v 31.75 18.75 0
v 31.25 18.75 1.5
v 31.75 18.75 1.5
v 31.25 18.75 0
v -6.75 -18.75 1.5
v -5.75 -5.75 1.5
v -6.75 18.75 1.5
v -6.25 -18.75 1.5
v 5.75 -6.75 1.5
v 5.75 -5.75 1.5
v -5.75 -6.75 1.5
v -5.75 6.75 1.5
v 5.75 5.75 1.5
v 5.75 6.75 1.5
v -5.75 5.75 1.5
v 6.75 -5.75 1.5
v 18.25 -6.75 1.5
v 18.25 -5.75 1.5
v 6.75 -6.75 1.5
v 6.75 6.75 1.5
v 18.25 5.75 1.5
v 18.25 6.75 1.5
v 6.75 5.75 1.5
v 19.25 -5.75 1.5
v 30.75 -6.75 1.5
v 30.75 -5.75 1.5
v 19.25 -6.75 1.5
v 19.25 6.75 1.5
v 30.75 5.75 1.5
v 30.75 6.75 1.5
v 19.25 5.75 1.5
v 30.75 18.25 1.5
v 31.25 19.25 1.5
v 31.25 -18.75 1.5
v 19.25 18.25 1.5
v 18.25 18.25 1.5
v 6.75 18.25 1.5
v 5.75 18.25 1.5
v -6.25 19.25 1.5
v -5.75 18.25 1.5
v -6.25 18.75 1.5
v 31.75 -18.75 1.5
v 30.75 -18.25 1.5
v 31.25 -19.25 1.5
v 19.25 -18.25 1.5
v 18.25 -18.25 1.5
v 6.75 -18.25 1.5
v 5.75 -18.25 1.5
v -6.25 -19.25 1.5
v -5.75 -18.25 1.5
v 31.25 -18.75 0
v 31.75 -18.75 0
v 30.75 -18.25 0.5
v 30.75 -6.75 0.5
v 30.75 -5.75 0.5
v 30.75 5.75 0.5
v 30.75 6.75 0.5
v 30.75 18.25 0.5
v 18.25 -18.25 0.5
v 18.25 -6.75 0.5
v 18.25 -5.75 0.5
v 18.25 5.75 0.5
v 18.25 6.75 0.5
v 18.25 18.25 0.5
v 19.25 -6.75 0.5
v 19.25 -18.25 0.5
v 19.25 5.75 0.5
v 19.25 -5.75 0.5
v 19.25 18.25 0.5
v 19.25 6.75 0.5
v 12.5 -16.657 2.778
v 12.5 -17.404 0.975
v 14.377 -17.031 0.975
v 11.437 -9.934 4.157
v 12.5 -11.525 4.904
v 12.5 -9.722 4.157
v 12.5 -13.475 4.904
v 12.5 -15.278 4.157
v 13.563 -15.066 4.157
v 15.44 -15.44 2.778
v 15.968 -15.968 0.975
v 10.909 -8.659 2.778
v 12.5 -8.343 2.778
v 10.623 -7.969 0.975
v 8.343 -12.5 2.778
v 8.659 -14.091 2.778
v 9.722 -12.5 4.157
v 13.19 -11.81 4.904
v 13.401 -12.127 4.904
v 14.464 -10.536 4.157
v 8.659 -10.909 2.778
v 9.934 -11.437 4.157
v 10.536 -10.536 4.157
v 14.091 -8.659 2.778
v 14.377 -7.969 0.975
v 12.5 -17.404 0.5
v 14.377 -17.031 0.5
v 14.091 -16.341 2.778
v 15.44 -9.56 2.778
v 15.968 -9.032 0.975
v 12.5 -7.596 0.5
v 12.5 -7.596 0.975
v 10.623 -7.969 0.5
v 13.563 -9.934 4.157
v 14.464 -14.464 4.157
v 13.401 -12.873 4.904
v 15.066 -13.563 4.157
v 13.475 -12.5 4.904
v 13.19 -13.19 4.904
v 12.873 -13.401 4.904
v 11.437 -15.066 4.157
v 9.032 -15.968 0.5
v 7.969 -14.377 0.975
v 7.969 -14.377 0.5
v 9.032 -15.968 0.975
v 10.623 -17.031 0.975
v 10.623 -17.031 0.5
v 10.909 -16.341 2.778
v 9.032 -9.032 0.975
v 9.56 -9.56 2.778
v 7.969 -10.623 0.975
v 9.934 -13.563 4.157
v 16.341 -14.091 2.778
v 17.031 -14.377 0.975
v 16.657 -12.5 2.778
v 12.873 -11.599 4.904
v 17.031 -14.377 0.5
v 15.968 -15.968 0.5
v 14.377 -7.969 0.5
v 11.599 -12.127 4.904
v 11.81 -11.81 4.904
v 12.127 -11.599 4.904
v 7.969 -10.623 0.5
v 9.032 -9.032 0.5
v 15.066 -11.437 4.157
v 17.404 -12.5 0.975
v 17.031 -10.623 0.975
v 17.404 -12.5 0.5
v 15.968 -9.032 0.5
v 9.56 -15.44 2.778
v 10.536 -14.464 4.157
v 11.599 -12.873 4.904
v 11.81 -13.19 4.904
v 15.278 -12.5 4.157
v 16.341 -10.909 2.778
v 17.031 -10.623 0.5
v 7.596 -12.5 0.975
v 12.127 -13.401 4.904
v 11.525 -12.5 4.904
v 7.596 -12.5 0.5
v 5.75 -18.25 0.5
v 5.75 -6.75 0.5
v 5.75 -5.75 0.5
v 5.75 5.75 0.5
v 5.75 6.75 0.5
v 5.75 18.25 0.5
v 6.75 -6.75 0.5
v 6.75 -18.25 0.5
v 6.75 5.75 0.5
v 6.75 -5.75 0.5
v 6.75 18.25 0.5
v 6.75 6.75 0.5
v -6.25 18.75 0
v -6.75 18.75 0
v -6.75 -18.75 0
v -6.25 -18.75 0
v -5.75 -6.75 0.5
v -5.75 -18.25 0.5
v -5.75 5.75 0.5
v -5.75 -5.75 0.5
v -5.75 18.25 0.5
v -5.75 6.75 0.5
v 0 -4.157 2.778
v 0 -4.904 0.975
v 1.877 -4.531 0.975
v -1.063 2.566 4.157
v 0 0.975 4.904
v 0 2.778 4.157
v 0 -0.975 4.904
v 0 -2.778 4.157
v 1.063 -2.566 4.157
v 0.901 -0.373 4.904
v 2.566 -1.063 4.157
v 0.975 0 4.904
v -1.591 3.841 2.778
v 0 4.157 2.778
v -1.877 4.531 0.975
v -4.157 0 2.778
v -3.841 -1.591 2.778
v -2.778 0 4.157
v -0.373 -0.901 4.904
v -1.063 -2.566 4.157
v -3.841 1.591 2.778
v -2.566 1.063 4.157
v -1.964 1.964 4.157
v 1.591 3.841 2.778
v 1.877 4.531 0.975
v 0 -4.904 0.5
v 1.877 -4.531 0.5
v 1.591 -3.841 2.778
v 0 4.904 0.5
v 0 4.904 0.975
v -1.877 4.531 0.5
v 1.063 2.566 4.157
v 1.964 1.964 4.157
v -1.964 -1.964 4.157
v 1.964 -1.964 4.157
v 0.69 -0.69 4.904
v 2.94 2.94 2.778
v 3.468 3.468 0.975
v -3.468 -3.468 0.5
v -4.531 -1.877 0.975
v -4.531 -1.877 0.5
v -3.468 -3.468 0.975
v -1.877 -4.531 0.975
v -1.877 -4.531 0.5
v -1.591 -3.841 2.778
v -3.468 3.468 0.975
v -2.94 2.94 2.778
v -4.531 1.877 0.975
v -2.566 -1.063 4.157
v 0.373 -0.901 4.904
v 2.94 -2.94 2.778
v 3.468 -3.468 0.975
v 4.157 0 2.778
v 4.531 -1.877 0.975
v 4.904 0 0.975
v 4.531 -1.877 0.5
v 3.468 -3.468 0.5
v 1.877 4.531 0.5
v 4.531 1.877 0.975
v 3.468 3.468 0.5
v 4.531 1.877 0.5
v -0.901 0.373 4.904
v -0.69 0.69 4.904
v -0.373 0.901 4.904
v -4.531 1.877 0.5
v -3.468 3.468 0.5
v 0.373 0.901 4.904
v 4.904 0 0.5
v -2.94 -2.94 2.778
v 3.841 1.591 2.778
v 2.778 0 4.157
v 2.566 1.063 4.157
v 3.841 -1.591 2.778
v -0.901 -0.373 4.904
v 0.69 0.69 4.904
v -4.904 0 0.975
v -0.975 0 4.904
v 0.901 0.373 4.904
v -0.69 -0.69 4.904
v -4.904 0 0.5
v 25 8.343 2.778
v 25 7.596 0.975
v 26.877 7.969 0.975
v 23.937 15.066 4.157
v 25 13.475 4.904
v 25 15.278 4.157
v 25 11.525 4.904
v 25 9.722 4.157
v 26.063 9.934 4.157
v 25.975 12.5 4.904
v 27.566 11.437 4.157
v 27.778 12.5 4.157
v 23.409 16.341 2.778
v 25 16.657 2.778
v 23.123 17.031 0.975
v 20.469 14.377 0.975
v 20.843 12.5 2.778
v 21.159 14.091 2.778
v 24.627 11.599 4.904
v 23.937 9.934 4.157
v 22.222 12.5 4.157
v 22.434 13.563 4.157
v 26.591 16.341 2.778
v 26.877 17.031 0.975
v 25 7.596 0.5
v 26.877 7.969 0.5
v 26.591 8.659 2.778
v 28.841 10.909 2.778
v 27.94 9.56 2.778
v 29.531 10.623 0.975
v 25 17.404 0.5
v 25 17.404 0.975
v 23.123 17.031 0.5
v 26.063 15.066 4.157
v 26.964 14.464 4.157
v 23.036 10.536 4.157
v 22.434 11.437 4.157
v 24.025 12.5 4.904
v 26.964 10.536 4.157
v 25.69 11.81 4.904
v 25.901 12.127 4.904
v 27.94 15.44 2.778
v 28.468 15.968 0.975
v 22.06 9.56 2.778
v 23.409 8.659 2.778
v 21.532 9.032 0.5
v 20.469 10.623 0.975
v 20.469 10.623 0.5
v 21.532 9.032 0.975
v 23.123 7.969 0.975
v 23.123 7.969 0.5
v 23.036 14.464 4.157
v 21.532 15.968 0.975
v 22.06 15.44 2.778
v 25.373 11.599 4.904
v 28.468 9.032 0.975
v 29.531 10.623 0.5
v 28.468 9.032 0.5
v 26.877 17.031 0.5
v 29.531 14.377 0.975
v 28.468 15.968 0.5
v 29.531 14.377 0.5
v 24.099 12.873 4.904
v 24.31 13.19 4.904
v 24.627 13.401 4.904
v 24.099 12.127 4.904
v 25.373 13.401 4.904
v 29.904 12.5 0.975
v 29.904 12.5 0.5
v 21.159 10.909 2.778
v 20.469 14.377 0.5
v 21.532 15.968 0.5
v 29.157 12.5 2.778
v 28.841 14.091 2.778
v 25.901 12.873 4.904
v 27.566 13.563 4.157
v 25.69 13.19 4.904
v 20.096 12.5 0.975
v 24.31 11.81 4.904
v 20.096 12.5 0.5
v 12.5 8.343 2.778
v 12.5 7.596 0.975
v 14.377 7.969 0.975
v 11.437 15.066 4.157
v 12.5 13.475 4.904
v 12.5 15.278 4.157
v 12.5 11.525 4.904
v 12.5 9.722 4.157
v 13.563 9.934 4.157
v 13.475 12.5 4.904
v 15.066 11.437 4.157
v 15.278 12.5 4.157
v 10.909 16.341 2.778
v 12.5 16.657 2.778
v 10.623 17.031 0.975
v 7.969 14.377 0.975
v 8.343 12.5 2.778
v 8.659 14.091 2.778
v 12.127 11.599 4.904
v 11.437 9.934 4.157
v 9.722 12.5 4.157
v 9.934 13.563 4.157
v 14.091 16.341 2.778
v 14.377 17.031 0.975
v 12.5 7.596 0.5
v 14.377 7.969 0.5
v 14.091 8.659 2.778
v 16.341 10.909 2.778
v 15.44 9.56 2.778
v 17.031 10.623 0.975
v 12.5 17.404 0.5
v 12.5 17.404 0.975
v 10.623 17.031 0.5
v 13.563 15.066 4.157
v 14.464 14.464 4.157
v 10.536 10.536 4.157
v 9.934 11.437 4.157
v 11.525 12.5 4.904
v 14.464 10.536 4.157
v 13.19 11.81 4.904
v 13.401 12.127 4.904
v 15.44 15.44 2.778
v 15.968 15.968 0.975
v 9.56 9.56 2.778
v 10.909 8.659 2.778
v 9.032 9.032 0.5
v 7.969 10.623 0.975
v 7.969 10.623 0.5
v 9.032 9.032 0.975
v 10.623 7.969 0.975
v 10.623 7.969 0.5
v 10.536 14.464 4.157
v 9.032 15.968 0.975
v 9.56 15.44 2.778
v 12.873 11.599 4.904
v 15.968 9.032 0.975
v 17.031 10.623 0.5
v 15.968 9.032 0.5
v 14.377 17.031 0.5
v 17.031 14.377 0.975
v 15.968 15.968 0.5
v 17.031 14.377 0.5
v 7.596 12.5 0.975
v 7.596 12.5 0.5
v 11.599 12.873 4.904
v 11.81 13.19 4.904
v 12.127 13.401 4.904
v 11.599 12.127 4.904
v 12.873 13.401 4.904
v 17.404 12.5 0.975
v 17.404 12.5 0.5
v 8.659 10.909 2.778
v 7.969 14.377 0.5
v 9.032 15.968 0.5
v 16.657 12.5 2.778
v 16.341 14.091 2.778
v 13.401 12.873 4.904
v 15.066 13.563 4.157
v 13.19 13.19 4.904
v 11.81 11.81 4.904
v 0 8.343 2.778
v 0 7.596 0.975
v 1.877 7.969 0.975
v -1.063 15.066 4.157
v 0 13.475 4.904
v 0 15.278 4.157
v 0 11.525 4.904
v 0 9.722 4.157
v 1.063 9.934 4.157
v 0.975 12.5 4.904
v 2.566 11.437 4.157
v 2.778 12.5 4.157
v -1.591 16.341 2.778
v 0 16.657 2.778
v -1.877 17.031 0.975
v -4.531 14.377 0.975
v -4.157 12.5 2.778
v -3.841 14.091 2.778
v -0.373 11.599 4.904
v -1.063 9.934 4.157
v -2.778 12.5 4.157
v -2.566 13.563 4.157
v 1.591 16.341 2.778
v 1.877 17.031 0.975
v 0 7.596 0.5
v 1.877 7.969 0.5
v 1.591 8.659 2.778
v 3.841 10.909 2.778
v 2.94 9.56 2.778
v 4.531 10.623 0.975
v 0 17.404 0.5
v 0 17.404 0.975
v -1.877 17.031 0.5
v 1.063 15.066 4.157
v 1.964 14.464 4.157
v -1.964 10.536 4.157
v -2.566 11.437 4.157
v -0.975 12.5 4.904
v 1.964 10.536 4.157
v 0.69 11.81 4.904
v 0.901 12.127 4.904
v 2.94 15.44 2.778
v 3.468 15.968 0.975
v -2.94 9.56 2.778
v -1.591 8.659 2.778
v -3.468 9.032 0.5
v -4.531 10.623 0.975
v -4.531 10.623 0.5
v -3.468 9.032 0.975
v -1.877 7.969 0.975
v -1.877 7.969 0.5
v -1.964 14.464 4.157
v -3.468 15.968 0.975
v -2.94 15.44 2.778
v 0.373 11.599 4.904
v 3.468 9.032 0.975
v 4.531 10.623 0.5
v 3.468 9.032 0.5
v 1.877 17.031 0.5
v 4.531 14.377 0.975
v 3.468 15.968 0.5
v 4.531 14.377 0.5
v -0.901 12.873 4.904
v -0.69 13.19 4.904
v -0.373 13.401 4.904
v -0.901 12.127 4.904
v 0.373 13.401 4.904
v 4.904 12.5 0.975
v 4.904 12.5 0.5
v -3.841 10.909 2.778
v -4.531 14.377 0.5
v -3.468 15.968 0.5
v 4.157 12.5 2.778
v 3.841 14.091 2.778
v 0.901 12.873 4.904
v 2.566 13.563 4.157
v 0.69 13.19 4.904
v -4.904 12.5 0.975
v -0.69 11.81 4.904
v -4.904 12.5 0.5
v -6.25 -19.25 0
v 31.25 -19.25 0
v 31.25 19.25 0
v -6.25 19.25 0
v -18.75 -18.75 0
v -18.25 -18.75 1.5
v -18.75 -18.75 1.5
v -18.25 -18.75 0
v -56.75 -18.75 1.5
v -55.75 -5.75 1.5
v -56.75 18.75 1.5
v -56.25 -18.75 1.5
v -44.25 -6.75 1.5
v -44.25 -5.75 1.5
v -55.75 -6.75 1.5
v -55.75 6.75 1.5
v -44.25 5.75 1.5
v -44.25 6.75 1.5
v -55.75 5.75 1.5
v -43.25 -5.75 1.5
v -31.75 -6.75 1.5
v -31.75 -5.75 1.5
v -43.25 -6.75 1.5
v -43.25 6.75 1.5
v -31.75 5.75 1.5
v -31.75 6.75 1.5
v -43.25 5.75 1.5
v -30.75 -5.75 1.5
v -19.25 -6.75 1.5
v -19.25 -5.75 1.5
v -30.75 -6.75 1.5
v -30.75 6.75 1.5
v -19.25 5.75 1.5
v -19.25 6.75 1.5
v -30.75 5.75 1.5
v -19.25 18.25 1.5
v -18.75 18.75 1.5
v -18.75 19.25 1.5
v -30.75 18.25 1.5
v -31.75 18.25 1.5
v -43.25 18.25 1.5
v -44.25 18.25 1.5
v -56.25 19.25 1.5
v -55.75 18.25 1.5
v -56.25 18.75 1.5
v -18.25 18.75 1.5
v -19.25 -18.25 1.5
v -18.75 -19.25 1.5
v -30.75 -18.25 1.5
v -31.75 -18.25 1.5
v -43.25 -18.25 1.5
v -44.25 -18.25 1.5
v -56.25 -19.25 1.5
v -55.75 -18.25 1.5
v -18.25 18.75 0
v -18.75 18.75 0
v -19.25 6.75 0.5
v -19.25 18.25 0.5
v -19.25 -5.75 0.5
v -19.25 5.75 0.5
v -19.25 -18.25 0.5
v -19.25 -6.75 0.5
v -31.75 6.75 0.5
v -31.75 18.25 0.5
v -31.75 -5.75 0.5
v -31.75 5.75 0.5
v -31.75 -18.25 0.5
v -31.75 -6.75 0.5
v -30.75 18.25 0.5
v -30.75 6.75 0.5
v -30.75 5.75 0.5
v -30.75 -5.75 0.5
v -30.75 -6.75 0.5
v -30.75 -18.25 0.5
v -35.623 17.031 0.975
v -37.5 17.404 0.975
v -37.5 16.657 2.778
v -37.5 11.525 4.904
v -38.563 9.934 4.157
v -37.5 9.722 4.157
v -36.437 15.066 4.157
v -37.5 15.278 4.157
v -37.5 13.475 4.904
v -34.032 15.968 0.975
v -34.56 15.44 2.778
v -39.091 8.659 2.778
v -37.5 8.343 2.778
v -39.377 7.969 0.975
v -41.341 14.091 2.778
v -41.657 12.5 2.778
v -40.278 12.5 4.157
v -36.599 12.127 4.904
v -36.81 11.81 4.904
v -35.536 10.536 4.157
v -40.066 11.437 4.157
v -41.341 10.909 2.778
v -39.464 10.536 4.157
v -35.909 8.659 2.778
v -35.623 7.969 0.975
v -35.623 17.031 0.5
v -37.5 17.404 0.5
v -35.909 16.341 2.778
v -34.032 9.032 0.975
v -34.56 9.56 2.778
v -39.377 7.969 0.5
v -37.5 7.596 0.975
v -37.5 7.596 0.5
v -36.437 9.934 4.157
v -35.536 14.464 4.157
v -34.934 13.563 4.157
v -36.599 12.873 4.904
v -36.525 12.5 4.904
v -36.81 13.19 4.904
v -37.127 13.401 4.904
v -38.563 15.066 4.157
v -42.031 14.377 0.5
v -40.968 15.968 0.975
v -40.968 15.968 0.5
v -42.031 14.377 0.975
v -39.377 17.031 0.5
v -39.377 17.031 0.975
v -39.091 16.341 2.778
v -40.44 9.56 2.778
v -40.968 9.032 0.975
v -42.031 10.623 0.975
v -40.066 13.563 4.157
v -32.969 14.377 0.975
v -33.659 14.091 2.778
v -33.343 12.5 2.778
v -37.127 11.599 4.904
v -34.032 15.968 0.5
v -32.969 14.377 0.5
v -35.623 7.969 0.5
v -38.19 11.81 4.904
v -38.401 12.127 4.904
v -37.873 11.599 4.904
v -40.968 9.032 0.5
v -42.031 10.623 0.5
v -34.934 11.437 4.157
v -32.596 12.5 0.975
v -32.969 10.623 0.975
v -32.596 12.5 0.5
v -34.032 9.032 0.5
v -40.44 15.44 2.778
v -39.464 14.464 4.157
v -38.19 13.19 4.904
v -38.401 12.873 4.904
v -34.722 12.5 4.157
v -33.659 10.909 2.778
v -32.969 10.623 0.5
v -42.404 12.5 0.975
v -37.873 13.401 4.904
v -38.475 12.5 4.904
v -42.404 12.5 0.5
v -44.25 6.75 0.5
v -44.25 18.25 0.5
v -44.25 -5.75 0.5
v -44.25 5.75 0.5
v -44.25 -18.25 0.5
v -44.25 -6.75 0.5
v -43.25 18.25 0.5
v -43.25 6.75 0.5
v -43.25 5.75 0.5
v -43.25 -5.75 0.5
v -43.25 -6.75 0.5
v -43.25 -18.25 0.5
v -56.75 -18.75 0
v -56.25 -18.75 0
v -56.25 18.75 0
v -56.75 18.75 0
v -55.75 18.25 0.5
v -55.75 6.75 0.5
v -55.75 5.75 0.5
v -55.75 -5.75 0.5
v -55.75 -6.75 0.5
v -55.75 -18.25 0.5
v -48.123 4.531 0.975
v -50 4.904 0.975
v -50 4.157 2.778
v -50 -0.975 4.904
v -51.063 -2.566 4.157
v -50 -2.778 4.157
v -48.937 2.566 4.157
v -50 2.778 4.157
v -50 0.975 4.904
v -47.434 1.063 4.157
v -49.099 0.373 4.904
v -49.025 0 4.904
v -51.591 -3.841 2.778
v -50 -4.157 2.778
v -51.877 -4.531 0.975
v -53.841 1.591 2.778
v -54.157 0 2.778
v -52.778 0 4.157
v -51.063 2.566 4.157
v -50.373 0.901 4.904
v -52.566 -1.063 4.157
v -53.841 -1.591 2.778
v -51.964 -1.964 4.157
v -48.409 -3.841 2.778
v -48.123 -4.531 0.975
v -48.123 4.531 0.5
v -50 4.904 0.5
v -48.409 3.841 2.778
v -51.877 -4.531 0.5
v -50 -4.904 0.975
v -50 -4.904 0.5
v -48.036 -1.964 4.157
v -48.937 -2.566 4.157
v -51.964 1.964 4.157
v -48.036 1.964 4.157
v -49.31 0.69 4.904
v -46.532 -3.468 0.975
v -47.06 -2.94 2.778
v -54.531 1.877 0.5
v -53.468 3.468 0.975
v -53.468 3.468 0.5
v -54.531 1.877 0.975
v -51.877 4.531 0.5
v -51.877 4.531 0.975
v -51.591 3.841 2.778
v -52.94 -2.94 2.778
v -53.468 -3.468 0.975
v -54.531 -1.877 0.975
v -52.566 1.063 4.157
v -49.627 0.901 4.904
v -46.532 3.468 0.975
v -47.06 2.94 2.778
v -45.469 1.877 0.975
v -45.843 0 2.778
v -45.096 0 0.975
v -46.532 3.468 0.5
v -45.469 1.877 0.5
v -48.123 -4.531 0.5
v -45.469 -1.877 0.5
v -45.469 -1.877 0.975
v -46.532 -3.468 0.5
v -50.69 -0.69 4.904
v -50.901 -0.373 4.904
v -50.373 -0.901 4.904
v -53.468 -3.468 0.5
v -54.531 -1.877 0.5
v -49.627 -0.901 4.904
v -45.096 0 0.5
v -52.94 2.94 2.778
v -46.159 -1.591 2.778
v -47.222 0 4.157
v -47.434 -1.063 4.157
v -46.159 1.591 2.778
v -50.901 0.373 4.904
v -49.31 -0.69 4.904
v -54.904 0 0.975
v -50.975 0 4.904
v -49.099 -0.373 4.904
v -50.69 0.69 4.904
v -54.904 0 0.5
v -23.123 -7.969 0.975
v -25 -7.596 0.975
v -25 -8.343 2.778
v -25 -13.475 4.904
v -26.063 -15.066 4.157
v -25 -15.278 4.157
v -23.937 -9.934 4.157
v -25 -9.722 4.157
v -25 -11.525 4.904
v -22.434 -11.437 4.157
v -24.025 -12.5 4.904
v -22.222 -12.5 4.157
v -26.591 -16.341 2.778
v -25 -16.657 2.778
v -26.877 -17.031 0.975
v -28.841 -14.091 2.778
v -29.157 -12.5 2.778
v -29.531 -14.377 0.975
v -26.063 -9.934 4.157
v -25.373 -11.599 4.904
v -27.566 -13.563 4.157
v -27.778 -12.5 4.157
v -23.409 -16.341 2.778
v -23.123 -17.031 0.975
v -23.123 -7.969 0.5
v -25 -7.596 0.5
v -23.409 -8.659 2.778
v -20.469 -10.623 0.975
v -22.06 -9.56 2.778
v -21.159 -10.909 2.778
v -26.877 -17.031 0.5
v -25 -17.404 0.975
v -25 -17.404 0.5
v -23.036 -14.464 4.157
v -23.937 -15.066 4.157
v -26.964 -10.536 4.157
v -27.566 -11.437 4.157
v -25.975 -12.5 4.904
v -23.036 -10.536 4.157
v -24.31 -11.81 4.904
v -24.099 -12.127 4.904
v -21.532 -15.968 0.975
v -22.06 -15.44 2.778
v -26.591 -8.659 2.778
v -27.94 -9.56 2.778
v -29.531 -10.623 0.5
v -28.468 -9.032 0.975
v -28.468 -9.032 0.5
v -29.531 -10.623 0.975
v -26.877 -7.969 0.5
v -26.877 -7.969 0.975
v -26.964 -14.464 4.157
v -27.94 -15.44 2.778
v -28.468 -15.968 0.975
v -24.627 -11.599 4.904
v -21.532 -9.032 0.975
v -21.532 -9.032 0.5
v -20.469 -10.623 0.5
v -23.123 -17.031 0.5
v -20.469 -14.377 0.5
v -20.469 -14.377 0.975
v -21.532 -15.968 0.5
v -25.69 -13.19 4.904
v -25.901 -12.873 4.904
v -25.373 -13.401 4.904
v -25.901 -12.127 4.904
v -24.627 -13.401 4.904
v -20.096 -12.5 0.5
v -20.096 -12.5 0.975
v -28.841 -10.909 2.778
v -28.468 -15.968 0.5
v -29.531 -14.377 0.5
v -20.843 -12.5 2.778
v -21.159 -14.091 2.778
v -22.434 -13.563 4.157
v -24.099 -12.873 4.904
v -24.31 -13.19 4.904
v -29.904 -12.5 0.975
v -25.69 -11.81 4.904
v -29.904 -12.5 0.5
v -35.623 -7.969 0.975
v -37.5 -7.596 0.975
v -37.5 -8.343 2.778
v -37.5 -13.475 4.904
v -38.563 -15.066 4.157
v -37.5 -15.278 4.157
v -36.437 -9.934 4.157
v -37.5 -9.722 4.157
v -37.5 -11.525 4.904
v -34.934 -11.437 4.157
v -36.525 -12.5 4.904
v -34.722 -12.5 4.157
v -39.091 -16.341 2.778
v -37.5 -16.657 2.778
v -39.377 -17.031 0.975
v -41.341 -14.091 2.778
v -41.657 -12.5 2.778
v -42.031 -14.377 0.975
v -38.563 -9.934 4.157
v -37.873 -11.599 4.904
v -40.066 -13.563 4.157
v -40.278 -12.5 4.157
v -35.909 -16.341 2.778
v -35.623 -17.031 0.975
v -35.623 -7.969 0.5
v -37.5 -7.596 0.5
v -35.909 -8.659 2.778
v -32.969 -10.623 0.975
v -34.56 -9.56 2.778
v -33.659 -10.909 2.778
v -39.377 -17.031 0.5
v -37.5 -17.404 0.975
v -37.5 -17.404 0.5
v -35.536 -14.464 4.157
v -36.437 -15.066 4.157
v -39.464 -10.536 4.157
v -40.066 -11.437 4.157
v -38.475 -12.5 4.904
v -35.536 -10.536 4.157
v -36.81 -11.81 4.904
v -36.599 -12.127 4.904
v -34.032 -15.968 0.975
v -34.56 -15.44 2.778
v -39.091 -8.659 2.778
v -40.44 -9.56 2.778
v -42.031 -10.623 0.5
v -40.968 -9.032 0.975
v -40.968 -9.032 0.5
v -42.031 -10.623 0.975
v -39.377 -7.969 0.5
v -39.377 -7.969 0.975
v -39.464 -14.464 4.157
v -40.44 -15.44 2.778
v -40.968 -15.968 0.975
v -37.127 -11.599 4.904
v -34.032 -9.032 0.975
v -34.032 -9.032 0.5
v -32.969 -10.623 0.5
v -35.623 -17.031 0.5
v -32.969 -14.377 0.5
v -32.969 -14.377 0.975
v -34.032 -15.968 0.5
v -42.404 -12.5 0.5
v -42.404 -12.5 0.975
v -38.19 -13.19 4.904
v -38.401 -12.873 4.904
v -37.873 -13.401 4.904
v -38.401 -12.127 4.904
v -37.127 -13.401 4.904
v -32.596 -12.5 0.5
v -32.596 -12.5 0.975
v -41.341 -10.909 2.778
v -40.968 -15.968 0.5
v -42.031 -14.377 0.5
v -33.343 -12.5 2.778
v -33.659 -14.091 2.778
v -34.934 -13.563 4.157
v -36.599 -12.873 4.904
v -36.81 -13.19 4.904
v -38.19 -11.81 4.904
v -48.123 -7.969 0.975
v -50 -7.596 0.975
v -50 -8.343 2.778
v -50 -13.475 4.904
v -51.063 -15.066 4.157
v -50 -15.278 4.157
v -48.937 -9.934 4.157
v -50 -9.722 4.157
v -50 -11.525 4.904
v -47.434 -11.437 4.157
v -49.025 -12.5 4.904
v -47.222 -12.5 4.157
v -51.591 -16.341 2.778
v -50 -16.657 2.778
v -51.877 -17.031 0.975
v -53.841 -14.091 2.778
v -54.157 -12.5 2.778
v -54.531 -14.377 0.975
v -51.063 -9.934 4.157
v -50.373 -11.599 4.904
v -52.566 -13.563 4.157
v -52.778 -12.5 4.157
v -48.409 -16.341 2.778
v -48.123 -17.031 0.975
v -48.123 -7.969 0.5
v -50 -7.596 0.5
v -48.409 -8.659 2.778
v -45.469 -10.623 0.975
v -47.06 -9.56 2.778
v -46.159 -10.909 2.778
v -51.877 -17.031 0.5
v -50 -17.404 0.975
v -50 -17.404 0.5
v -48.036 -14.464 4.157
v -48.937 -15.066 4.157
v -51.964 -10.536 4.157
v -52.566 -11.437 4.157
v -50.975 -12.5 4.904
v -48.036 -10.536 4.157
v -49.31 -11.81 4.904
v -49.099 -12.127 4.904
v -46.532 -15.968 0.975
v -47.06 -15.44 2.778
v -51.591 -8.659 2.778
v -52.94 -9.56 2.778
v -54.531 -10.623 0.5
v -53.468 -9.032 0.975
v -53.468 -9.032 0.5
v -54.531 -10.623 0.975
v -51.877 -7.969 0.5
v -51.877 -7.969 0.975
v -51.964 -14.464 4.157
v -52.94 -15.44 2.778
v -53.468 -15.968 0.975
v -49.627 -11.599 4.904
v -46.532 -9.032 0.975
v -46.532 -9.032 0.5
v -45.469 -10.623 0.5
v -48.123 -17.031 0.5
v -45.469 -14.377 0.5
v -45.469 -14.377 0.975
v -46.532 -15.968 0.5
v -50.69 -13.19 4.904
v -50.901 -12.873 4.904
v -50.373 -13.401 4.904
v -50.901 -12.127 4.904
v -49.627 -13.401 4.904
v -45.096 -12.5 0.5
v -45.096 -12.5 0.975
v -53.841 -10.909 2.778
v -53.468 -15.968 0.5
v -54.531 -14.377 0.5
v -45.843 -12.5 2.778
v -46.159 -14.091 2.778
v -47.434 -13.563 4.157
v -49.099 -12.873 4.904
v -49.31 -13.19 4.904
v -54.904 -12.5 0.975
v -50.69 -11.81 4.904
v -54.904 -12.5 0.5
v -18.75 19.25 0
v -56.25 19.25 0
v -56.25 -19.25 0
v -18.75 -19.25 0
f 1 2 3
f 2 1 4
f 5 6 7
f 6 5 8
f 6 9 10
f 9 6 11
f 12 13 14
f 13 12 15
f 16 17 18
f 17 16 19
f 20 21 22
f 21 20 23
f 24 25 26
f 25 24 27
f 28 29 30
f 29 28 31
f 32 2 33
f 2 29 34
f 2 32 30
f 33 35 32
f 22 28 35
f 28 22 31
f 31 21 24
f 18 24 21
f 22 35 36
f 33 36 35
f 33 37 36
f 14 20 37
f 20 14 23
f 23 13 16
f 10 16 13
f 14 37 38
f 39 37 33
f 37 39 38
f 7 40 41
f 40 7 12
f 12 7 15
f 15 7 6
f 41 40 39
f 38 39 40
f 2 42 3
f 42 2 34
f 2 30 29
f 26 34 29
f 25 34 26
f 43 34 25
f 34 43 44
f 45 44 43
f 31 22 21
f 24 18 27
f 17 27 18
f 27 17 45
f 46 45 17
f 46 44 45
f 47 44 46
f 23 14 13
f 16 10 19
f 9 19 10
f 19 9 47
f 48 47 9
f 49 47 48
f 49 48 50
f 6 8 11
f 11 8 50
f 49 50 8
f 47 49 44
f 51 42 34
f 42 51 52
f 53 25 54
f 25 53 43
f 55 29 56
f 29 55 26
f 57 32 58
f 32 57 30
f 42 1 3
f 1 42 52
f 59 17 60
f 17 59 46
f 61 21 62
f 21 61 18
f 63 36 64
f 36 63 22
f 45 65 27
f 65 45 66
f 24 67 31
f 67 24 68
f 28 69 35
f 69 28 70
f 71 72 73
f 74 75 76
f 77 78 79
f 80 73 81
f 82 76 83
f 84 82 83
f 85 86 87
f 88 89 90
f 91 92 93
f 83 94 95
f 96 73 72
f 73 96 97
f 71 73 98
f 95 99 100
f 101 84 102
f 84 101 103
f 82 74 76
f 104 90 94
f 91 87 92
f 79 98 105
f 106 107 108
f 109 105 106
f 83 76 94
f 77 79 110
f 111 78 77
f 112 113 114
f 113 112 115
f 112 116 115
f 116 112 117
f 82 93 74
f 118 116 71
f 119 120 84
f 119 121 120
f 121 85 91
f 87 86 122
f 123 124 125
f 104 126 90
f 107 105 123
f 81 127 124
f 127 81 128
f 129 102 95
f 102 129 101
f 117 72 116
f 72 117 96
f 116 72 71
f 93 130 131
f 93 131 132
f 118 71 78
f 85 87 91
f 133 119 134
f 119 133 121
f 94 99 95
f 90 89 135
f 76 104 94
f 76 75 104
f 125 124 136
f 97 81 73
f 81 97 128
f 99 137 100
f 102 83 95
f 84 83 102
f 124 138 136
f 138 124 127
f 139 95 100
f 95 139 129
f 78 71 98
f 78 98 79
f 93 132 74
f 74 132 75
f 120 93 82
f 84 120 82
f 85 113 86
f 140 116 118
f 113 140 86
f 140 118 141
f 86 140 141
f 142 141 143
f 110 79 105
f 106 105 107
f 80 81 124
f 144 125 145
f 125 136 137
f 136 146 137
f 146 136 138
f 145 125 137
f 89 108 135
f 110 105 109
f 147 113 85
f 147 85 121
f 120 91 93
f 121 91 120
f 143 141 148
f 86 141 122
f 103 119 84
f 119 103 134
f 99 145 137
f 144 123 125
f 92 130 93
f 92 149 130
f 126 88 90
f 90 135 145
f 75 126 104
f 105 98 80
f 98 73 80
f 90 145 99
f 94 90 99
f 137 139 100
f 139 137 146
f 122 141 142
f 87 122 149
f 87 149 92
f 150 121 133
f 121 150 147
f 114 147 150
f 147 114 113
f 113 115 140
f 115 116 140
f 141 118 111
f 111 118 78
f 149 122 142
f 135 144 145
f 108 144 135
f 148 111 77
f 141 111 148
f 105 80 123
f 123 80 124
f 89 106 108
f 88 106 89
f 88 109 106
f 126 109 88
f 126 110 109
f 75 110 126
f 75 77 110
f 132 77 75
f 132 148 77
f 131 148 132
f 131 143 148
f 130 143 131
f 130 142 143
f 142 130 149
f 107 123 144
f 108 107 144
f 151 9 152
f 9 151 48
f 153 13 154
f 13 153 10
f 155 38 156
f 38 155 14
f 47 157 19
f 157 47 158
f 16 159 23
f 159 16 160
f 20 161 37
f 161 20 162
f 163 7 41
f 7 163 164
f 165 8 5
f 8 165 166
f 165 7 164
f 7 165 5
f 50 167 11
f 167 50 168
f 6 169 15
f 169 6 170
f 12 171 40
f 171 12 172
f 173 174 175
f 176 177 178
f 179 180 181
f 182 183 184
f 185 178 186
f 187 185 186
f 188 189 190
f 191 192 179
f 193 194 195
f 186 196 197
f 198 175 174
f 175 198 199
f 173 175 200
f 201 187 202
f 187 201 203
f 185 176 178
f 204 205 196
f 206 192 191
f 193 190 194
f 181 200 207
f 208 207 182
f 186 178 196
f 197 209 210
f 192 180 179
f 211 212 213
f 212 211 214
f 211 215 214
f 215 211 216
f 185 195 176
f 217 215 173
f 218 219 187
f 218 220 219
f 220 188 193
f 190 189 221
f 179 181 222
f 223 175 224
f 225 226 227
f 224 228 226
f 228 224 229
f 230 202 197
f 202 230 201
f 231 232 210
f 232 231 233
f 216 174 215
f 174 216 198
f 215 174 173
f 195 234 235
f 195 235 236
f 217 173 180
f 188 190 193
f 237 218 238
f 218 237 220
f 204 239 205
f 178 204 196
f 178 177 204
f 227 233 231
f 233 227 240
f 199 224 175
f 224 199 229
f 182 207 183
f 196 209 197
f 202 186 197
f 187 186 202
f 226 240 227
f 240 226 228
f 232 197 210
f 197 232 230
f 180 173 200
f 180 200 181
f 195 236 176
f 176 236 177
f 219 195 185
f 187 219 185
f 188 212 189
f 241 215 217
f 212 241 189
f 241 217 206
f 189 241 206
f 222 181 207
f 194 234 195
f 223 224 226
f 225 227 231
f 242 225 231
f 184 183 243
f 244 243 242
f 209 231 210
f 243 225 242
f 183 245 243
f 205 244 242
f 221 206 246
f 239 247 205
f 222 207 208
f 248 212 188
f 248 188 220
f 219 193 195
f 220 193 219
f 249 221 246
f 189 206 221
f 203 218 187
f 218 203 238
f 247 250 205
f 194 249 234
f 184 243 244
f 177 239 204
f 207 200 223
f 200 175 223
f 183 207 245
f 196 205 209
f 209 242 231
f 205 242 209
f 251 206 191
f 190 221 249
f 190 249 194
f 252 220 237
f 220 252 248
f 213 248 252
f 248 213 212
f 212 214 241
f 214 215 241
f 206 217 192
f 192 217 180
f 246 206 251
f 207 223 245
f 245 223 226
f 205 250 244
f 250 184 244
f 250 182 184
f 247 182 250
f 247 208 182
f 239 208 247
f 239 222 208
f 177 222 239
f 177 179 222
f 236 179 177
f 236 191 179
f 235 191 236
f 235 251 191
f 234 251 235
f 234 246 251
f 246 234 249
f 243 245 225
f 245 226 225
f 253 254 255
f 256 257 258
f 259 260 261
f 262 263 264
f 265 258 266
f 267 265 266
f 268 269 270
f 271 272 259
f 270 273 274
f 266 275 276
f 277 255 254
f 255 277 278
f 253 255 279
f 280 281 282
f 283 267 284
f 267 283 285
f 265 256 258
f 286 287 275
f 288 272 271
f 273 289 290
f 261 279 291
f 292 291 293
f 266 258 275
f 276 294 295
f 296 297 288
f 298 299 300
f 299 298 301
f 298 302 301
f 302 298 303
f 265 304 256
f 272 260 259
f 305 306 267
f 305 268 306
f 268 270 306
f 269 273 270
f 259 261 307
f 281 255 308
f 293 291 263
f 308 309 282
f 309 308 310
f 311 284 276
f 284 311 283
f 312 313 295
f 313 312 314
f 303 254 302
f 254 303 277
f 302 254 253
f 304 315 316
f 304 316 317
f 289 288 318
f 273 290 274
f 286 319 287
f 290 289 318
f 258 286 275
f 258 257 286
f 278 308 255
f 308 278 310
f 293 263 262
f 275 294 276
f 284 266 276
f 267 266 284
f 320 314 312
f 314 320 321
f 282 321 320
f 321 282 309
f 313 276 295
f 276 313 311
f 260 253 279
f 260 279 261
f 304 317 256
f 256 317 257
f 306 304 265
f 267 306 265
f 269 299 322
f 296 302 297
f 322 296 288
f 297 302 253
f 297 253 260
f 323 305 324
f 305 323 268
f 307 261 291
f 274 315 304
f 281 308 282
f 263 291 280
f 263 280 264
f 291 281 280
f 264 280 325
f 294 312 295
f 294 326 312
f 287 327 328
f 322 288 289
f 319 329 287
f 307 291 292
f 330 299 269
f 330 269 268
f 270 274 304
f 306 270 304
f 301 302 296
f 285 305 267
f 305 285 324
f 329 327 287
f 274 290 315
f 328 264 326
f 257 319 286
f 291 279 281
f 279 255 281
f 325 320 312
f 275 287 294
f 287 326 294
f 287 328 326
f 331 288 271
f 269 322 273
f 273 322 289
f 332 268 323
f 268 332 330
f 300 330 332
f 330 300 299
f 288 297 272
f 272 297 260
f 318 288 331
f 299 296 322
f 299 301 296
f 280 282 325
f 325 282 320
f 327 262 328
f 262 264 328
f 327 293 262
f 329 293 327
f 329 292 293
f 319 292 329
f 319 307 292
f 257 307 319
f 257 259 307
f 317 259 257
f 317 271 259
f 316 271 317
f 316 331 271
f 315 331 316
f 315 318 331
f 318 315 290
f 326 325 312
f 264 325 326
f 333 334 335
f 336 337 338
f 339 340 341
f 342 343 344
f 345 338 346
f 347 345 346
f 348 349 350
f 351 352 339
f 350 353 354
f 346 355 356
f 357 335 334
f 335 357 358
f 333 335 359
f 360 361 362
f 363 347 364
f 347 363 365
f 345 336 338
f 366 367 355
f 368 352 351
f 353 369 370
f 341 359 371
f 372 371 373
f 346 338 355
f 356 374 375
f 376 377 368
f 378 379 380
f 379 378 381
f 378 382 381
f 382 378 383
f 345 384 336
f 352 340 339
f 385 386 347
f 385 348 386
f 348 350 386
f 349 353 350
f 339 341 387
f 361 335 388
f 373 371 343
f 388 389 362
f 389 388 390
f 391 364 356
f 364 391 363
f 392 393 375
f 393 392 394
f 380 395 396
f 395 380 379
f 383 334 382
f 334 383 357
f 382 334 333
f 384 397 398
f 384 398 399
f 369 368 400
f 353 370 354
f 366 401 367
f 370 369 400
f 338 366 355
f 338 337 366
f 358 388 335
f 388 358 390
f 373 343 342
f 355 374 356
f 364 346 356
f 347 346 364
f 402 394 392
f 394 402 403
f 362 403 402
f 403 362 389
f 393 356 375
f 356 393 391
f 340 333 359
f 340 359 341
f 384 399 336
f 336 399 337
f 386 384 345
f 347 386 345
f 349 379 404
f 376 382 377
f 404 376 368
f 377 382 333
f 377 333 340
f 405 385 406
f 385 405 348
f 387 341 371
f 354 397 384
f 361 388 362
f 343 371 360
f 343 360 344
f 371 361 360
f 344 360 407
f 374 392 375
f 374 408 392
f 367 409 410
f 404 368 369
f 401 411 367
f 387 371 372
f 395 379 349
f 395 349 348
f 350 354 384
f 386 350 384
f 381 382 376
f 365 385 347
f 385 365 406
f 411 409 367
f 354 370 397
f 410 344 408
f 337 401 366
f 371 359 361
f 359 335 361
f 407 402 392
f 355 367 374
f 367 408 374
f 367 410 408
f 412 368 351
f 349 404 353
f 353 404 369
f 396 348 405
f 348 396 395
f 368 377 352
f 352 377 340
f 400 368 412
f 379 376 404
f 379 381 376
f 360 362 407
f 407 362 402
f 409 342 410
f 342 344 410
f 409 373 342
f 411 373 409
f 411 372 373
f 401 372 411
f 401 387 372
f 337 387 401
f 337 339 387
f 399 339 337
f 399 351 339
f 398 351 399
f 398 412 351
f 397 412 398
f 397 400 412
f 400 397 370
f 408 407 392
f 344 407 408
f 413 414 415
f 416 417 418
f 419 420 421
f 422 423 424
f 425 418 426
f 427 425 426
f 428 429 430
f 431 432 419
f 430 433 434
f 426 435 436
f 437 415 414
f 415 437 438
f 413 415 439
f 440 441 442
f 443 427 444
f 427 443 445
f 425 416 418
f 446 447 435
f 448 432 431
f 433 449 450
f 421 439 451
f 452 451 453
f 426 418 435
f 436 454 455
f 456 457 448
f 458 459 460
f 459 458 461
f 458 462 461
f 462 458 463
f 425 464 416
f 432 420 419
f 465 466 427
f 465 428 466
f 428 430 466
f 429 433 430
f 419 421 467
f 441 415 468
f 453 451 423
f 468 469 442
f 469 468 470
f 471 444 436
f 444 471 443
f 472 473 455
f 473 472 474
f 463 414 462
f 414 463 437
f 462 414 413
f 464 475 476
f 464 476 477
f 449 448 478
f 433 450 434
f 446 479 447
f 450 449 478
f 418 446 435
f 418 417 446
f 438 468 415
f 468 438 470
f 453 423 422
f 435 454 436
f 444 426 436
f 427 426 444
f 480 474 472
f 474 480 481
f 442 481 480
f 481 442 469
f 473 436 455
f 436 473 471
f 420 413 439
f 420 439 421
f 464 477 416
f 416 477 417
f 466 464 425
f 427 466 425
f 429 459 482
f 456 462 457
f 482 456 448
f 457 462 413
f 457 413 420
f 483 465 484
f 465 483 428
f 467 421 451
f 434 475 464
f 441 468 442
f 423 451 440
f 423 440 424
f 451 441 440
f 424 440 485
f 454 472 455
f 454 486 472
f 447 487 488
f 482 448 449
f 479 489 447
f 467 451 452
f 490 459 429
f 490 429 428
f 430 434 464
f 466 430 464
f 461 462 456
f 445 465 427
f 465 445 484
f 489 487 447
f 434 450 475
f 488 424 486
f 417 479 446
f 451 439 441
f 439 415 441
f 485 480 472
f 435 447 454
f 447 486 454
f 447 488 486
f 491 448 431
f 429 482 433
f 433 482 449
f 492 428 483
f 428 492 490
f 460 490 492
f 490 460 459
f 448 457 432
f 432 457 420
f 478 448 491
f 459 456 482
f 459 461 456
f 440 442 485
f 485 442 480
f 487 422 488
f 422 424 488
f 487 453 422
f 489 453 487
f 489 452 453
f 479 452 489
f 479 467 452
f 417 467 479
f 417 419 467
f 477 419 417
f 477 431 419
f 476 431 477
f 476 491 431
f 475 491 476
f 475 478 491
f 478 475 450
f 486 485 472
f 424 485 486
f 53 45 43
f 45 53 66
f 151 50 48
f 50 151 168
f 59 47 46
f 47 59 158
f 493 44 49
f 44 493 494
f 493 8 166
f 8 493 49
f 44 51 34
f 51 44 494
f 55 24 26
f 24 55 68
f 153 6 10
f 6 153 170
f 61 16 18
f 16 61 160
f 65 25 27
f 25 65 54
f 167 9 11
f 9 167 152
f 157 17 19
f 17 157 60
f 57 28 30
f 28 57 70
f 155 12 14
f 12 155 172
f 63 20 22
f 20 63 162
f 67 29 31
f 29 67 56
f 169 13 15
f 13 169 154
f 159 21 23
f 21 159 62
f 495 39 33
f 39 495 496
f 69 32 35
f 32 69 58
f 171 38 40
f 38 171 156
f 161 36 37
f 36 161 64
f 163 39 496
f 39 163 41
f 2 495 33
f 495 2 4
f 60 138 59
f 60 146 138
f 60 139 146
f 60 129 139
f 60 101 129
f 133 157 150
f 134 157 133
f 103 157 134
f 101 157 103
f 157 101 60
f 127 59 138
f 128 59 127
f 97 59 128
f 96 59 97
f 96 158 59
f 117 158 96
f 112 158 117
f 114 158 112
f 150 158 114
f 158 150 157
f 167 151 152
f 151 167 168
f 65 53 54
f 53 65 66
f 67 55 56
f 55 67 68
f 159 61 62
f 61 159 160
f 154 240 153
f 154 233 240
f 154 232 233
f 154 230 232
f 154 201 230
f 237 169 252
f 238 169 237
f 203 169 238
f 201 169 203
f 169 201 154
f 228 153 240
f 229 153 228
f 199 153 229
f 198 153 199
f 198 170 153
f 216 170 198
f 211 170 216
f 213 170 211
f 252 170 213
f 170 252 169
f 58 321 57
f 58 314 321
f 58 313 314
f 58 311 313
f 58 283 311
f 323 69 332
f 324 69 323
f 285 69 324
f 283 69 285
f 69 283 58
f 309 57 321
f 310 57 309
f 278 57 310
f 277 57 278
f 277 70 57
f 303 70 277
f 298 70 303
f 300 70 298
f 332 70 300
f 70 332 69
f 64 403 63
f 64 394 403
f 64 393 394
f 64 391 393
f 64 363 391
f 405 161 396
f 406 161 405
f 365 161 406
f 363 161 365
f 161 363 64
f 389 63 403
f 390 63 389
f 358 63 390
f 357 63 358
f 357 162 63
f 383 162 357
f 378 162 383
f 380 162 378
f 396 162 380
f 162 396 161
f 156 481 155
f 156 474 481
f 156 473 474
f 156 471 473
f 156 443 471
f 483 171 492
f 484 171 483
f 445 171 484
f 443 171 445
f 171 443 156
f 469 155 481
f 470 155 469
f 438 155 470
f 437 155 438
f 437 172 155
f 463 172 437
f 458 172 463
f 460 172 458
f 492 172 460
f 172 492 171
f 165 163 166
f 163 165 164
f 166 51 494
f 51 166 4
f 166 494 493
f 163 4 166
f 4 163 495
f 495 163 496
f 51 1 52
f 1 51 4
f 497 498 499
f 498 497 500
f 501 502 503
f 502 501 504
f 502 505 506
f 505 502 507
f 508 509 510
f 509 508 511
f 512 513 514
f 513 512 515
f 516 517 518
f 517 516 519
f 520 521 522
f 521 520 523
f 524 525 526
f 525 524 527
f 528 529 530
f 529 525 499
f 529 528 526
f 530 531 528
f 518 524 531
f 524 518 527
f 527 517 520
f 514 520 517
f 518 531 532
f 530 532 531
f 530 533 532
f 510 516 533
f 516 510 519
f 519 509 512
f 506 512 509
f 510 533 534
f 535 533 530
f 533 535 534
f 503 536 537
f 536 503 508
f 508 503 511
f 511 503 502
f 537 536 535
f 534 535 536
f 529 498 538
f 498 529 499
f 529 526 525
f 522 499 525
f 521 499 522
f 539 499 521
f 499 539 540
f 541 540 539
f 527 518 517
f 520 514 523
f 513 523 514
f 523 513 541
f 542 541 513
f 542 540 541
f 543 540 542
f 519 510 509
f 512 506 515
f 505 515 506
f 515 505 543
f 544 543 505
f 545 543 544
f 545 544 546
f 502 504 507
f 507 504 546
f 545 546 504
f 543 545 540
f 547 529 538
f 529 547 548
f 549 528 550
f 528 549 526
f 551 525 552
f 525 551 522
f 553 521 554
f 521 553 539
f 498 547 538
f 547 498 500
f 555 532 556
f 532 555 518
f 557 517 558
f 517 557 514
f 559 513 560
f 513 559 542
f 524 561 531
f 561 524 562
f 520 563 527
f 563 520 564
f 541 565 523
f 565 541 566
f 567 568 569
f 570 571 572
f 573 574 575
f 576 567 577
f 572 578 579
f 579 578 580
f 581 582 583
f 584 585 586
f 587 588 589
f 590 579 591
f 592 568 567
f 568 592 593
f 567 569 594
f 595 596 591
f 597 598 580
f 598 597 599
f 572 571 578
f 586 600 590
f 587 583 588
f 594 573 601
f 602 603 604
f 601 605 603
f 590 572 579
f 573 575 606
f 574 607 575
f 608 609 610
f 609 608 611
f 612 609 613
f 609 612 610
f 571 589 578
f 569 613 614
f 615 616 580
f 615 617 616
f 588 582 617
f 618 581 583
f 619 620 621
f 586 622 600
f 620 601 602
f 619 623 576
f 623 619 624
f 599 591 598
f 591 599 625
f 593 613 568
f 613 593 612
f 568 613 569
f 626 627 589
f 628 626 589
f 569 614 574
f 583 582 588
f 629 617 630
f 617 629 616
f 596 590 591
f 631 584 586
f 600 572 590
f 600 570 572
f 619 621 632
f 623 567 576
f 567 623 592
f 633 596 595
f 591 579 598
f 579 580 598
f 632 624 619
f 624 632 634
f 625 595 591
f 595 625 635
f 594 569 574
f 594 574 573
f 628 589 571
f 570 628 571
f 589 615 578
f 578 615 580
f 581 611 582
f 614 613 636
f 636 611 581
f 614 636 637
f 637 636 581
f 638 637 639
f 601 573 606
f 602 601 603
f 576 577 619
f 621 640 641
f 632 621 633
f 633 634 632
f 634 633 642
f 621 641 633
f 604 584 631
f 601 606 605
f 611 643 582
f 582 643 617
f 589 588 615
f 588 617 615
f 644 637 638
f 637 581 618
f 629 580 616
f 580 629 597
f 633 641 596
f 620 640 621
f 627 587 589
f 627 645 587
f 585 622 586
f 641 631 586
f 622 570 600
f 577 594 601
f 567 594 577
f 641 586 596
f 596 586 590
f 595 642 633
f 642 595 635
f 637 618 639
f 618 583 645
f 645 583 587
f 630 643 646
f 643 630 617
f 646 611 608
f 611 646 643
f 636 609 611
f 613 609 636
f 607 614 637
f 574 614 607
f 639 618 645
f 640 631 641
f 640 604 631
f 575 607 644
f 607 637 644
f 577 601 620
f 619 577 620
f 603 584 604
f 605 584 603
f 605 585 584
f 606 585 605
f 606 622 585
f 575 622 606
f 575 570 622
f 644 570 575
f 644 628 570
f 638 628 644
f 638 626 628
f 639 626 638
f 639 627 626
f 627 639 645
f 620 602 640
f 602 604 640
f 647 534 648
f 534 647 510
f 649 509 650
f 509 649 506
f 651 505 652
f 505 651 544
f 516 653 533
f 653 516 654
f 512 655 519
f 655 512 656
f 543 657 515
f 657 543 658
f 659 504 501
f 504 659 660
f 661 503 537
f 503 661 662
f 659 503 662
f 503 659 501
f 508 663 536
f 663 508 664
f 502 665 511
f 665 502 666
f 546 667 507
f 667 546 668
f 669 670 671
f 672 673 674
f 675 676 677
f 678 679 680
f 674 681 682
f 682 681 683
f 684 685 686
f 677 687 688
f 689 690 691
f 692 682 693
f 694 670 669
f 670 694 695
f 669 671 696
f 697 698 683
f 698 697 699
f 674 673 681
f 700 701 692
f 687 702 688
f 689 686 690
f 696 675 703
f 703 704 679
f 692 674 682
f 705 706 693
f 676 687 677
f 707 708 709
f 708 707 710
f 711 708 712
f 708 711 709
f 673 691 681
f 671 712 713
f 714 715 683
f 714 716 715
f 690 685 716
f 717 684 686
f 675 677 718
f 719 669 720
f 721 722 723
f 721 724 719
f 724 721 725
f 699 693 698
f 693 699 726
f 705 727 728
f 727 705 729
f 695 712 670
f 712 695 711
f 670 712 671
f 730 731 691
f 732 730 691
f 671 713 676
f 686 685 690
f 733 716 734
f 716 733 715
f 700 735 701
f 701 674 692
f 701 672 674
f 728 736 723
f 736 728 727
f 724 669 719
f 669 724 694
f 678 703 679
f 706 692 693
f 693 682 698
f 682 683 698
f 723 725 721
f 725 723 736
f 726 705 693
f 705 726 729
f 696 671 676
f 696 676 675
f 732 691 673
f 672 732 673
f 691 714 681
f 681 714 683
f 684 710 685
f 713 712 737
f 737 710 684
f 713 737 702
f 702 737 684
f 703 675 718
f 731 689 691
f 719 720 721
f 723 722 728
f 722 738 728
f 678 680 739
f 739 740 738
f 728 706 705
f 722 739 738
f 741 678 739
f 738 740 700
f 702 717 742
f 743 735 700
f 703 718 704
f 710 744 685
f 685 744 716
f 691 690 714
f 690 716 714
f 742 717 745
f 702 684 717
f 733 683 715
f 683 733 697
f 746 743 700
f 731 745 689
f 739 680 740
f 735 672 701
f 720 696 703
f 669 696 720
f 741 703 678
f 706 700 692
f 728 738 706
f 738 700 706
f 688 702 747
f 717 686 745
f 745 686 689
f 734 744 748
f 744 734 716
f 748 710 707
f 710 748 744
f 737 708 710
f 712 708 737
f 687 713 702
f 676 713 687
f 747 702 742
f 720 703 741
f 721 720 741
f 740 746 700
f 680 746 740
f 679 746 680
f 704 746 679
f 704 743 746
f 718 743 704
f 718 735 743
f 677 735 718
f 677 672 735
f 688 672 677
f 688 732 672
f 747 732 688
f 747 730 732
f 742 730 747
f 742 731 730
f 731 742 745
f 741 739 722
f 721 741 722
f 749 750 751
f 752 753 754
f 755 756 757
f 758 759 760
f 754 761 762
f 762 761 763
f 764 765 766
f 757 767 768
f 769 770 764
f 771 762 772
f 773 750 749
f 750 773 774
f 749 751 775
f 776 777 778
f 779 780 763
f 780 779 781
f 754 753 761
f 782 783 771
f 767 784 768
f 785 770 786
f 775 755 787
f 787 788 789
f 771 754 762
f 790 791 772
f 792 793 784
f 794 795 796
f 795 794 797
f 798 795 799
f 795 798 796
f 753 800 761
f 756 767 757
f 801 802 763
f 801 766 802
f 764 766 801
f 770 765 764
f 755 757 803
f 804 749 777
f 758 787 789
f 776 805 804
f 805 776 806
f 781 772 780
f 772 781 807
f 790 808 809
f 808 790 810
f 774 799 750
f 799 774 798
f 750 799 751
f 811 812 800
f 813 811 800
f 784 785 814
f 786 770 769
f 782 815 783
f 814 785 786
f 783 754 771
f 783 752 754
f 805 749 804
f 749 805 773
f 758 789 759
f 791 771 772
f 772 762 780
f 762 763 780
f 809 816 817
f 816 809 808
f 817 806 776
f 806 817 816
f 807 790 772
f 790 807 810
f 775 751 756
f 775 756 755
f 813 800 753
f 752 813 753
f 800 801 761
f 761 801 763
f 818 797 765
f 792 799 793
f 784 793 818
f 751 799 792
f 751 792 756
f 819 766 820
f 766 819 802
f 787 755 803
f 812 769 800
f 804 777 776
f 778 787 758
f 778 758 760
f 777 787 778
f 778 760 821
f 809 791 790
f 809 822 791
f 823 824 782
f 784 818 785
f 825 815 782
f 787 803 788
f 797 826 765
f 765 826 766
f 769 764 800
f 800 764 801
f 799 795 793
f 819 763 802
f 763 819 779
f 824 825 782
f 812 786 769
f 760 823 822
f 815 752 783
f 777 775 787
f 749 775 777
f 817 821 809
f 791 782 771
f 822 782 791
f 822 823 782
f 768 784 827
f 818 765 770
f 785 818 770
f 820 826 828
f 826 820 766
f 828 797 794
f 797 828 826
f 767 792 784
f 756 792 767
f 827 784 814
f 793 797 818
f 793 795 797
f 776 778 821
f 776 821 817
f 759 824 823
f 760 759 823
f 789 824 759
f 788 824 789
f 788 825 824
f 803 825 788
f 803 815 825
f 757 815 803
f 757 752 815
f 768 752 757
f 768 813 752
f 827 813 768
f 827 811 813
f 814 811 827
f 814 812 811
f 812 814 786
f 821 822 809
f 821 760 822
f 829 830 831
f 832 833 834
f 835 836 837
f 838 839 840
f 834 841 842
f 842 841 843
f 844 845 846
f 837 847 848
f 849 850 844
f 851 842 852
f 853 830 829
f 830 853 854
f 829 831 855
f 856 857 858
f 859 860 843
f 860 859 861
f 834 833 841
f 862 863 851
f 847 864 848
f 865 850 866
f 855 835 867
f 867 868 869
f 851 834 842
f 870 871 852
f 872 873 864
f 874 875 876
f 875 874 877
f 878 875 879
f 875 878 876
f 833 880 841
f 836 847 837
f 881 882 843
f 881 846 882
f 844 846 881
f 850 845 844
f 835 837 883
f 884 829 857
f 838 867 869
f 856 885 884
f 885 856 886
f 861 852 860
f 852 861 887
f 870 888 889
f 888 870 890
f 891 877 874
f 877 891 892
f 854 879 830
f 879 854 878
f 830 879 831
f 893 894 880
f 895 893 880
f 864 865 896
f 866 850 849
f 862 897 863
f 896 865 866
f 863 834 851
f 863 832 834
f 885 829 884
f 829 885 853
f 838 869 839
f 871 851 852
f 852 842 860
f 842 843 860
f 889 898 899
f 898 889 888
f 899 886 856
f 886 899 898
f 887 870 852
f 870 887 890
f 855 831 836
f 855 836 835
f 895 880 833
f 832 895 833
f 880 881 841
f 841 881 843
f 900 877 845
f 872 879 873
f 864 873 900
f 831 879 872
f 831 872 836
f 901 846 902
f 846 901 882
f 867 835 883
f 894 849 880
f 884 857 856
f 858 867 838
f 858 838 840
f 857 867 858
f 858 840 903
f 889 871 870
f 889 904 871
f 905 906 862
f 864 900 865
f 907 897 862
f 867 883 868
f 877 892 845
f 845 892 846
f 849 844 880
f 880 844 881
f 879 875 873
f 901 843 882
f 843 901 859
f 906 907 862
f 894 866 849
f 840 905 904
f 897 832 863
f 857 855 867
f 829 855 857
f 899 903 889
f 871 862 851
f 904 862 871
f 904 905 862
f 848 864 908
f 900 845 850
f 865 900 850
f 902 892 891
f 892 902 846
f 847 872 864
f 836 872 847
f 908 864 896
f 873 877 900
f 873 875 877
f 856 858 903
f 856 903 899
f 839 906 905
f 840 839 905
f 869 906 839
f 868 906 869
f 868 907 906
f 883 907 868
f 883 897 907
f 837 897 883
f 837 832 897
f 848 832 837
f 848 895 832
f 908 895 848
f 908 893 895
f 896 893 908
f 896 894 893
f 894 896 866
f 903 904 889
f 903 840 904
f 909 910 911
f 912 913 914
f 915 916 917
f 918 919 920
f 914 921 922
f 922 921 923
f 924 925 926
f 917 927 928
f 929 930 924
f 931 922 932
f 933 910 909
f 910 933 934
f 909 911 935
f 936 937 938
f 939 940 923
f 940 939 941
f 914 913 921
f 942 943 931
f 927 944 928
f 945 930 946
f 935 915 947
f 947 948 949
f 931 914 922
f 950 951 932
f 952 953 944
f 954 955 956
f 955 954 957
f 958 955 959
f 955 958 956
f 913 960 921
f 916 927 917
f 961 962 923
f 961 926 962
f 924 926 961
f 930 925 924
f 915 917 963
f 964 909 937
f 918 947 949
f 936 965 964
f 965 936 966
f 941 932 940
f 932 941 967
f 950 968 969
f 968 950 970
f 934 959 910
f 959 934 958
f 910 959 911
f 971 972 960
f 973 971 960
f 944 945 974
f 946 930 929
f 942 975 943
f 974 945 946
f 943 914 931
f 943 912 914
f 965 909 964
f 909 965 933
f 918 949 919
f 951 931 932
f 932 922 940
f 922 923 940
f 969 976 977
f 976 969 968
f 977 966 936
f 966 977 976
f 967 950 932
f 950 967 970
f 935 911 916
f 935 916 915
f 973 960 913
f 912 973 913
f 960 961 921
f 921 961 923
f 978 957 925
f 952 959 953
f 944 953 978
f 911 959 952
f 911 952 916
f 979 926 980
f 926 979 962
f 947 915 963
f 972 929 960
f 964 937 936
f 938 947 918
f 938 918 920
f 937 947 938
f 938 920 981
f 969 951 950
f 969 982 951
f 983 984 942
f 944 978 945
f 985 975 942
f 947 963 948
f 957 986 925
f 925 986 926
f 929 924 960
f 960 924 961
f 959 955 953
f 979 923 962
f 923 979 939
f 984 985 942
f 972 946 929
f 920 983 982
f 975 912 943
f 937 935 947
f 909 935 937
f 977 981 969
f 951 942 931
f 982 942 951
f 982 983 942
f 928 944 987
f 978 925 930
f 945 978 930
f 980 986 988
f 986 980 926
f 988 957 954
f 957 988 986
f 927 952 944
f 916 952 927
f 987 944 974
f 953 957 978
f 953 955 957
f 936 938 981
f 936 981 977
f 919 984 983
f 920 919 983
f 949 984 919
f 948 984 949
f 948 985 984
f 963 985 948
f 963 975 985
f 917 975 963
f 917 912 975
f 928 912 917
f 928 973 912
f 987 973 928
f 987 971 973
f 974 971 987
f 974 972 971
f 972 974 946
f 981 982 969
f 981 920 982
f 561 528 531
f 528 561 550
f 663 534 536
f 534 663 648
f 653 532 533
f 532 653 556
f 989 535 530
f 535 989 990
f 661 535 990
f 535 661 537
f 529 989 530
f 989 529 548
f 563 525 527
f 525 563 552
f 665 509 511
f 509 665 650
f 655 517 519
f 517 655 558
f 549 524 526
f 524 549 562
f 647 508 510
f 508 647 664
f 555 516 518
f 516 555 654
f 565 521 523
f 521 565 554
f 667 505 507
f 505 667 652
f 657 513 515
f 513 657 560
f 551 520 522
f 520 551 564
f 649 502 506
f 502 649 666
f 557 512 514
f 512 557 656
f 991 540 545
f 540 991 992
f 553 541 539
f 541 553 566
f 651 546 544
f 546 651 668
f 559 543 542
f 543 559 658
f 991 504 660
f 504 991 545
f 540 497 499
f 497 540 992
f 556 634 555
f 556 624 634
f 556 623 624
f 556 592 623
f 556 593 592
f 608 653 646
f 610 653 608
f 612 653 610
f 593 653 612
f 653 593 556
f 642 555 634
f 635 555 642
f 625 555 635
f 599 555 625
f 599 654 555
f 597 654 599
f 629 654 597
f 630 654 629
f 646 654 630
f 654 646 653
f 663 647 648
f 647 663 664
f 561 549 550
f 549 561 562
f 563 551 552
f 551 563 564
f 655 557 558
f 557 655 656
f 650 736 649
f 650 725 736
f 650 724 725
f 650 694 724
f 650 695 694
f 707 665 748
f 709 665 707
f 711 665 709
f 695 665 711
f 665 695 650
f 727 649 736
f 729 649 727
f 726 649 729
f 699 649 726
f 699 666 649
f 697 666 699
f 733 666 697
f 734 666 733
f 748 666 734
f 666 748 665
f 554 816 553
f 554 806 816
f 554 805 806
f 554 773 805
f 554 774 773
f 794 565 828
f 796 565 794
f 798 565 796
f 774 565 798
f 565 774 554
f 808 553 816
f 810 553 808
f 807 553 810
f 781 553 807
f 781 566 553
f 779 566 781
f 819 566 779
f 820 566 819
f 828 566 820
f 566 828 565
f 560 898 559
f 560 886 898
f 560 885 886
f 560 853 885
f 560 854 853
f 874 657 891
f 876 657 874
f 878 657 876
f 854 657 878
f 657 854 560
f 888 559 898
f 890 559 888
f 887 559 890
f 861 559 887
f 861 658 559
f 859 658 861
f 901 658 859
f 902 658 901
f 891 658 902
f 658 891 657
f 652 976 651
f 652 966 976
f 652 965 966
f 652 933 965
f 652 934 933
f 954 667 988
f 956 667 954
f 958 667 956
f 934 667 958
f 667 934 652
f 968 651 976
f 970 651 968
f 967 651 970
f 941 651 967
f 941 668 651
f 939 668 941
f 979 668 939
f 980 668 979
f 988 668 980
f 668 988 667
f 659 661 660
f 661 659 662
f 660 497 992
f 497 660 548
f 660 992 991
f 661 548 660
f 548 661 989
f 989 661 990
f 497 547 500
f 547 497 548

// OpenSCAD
module glider(diam,x,y,blobs){
	d=diam*1.25;
	translate([d,d,0]){
		cube([d*x,d*y,1],center=true);
	}
	for(i=[0:x]){
		translate([-d/2+i*d,d,0]) cube([1,d*y,3],center=true);
		for(j=[0:y]){
			translate([d,-d/2+j*d,0]) cube([d*x,1,3],center=true);
			if(blobs[i][j]){
				translate([i*d,j*d,0]) sphere(r=diam/2);
			}
		}
	}
}
hookr=0;
hookt=0;
hookh=0;
module semiglider(){
	difference(){
		union(){
			glider(10,3,3,[[false,true,false],[false,false,true],[true,true,true]]);
			translate([-5*1.25,5*2*1.25,0]) difference(){
				intersection(){
					cylinder(h=1,r=hookr+hookt);
					translate([-hookr*2,0,0]) cube([hookr*4,hookr*4,hookh*2],center=true);
				}
				translate([0,0,0.4]) cylinder(h=hookh,r=hookr);
			}
		}
		translate([0,0,-20])cube([100,100,40],true);
	}
}
rotate([0,0,90]) union(){
	translate([-12.5,-25,0]) semiglider();
	translate([12.5,25,0]) mirror()semiglider();
}
